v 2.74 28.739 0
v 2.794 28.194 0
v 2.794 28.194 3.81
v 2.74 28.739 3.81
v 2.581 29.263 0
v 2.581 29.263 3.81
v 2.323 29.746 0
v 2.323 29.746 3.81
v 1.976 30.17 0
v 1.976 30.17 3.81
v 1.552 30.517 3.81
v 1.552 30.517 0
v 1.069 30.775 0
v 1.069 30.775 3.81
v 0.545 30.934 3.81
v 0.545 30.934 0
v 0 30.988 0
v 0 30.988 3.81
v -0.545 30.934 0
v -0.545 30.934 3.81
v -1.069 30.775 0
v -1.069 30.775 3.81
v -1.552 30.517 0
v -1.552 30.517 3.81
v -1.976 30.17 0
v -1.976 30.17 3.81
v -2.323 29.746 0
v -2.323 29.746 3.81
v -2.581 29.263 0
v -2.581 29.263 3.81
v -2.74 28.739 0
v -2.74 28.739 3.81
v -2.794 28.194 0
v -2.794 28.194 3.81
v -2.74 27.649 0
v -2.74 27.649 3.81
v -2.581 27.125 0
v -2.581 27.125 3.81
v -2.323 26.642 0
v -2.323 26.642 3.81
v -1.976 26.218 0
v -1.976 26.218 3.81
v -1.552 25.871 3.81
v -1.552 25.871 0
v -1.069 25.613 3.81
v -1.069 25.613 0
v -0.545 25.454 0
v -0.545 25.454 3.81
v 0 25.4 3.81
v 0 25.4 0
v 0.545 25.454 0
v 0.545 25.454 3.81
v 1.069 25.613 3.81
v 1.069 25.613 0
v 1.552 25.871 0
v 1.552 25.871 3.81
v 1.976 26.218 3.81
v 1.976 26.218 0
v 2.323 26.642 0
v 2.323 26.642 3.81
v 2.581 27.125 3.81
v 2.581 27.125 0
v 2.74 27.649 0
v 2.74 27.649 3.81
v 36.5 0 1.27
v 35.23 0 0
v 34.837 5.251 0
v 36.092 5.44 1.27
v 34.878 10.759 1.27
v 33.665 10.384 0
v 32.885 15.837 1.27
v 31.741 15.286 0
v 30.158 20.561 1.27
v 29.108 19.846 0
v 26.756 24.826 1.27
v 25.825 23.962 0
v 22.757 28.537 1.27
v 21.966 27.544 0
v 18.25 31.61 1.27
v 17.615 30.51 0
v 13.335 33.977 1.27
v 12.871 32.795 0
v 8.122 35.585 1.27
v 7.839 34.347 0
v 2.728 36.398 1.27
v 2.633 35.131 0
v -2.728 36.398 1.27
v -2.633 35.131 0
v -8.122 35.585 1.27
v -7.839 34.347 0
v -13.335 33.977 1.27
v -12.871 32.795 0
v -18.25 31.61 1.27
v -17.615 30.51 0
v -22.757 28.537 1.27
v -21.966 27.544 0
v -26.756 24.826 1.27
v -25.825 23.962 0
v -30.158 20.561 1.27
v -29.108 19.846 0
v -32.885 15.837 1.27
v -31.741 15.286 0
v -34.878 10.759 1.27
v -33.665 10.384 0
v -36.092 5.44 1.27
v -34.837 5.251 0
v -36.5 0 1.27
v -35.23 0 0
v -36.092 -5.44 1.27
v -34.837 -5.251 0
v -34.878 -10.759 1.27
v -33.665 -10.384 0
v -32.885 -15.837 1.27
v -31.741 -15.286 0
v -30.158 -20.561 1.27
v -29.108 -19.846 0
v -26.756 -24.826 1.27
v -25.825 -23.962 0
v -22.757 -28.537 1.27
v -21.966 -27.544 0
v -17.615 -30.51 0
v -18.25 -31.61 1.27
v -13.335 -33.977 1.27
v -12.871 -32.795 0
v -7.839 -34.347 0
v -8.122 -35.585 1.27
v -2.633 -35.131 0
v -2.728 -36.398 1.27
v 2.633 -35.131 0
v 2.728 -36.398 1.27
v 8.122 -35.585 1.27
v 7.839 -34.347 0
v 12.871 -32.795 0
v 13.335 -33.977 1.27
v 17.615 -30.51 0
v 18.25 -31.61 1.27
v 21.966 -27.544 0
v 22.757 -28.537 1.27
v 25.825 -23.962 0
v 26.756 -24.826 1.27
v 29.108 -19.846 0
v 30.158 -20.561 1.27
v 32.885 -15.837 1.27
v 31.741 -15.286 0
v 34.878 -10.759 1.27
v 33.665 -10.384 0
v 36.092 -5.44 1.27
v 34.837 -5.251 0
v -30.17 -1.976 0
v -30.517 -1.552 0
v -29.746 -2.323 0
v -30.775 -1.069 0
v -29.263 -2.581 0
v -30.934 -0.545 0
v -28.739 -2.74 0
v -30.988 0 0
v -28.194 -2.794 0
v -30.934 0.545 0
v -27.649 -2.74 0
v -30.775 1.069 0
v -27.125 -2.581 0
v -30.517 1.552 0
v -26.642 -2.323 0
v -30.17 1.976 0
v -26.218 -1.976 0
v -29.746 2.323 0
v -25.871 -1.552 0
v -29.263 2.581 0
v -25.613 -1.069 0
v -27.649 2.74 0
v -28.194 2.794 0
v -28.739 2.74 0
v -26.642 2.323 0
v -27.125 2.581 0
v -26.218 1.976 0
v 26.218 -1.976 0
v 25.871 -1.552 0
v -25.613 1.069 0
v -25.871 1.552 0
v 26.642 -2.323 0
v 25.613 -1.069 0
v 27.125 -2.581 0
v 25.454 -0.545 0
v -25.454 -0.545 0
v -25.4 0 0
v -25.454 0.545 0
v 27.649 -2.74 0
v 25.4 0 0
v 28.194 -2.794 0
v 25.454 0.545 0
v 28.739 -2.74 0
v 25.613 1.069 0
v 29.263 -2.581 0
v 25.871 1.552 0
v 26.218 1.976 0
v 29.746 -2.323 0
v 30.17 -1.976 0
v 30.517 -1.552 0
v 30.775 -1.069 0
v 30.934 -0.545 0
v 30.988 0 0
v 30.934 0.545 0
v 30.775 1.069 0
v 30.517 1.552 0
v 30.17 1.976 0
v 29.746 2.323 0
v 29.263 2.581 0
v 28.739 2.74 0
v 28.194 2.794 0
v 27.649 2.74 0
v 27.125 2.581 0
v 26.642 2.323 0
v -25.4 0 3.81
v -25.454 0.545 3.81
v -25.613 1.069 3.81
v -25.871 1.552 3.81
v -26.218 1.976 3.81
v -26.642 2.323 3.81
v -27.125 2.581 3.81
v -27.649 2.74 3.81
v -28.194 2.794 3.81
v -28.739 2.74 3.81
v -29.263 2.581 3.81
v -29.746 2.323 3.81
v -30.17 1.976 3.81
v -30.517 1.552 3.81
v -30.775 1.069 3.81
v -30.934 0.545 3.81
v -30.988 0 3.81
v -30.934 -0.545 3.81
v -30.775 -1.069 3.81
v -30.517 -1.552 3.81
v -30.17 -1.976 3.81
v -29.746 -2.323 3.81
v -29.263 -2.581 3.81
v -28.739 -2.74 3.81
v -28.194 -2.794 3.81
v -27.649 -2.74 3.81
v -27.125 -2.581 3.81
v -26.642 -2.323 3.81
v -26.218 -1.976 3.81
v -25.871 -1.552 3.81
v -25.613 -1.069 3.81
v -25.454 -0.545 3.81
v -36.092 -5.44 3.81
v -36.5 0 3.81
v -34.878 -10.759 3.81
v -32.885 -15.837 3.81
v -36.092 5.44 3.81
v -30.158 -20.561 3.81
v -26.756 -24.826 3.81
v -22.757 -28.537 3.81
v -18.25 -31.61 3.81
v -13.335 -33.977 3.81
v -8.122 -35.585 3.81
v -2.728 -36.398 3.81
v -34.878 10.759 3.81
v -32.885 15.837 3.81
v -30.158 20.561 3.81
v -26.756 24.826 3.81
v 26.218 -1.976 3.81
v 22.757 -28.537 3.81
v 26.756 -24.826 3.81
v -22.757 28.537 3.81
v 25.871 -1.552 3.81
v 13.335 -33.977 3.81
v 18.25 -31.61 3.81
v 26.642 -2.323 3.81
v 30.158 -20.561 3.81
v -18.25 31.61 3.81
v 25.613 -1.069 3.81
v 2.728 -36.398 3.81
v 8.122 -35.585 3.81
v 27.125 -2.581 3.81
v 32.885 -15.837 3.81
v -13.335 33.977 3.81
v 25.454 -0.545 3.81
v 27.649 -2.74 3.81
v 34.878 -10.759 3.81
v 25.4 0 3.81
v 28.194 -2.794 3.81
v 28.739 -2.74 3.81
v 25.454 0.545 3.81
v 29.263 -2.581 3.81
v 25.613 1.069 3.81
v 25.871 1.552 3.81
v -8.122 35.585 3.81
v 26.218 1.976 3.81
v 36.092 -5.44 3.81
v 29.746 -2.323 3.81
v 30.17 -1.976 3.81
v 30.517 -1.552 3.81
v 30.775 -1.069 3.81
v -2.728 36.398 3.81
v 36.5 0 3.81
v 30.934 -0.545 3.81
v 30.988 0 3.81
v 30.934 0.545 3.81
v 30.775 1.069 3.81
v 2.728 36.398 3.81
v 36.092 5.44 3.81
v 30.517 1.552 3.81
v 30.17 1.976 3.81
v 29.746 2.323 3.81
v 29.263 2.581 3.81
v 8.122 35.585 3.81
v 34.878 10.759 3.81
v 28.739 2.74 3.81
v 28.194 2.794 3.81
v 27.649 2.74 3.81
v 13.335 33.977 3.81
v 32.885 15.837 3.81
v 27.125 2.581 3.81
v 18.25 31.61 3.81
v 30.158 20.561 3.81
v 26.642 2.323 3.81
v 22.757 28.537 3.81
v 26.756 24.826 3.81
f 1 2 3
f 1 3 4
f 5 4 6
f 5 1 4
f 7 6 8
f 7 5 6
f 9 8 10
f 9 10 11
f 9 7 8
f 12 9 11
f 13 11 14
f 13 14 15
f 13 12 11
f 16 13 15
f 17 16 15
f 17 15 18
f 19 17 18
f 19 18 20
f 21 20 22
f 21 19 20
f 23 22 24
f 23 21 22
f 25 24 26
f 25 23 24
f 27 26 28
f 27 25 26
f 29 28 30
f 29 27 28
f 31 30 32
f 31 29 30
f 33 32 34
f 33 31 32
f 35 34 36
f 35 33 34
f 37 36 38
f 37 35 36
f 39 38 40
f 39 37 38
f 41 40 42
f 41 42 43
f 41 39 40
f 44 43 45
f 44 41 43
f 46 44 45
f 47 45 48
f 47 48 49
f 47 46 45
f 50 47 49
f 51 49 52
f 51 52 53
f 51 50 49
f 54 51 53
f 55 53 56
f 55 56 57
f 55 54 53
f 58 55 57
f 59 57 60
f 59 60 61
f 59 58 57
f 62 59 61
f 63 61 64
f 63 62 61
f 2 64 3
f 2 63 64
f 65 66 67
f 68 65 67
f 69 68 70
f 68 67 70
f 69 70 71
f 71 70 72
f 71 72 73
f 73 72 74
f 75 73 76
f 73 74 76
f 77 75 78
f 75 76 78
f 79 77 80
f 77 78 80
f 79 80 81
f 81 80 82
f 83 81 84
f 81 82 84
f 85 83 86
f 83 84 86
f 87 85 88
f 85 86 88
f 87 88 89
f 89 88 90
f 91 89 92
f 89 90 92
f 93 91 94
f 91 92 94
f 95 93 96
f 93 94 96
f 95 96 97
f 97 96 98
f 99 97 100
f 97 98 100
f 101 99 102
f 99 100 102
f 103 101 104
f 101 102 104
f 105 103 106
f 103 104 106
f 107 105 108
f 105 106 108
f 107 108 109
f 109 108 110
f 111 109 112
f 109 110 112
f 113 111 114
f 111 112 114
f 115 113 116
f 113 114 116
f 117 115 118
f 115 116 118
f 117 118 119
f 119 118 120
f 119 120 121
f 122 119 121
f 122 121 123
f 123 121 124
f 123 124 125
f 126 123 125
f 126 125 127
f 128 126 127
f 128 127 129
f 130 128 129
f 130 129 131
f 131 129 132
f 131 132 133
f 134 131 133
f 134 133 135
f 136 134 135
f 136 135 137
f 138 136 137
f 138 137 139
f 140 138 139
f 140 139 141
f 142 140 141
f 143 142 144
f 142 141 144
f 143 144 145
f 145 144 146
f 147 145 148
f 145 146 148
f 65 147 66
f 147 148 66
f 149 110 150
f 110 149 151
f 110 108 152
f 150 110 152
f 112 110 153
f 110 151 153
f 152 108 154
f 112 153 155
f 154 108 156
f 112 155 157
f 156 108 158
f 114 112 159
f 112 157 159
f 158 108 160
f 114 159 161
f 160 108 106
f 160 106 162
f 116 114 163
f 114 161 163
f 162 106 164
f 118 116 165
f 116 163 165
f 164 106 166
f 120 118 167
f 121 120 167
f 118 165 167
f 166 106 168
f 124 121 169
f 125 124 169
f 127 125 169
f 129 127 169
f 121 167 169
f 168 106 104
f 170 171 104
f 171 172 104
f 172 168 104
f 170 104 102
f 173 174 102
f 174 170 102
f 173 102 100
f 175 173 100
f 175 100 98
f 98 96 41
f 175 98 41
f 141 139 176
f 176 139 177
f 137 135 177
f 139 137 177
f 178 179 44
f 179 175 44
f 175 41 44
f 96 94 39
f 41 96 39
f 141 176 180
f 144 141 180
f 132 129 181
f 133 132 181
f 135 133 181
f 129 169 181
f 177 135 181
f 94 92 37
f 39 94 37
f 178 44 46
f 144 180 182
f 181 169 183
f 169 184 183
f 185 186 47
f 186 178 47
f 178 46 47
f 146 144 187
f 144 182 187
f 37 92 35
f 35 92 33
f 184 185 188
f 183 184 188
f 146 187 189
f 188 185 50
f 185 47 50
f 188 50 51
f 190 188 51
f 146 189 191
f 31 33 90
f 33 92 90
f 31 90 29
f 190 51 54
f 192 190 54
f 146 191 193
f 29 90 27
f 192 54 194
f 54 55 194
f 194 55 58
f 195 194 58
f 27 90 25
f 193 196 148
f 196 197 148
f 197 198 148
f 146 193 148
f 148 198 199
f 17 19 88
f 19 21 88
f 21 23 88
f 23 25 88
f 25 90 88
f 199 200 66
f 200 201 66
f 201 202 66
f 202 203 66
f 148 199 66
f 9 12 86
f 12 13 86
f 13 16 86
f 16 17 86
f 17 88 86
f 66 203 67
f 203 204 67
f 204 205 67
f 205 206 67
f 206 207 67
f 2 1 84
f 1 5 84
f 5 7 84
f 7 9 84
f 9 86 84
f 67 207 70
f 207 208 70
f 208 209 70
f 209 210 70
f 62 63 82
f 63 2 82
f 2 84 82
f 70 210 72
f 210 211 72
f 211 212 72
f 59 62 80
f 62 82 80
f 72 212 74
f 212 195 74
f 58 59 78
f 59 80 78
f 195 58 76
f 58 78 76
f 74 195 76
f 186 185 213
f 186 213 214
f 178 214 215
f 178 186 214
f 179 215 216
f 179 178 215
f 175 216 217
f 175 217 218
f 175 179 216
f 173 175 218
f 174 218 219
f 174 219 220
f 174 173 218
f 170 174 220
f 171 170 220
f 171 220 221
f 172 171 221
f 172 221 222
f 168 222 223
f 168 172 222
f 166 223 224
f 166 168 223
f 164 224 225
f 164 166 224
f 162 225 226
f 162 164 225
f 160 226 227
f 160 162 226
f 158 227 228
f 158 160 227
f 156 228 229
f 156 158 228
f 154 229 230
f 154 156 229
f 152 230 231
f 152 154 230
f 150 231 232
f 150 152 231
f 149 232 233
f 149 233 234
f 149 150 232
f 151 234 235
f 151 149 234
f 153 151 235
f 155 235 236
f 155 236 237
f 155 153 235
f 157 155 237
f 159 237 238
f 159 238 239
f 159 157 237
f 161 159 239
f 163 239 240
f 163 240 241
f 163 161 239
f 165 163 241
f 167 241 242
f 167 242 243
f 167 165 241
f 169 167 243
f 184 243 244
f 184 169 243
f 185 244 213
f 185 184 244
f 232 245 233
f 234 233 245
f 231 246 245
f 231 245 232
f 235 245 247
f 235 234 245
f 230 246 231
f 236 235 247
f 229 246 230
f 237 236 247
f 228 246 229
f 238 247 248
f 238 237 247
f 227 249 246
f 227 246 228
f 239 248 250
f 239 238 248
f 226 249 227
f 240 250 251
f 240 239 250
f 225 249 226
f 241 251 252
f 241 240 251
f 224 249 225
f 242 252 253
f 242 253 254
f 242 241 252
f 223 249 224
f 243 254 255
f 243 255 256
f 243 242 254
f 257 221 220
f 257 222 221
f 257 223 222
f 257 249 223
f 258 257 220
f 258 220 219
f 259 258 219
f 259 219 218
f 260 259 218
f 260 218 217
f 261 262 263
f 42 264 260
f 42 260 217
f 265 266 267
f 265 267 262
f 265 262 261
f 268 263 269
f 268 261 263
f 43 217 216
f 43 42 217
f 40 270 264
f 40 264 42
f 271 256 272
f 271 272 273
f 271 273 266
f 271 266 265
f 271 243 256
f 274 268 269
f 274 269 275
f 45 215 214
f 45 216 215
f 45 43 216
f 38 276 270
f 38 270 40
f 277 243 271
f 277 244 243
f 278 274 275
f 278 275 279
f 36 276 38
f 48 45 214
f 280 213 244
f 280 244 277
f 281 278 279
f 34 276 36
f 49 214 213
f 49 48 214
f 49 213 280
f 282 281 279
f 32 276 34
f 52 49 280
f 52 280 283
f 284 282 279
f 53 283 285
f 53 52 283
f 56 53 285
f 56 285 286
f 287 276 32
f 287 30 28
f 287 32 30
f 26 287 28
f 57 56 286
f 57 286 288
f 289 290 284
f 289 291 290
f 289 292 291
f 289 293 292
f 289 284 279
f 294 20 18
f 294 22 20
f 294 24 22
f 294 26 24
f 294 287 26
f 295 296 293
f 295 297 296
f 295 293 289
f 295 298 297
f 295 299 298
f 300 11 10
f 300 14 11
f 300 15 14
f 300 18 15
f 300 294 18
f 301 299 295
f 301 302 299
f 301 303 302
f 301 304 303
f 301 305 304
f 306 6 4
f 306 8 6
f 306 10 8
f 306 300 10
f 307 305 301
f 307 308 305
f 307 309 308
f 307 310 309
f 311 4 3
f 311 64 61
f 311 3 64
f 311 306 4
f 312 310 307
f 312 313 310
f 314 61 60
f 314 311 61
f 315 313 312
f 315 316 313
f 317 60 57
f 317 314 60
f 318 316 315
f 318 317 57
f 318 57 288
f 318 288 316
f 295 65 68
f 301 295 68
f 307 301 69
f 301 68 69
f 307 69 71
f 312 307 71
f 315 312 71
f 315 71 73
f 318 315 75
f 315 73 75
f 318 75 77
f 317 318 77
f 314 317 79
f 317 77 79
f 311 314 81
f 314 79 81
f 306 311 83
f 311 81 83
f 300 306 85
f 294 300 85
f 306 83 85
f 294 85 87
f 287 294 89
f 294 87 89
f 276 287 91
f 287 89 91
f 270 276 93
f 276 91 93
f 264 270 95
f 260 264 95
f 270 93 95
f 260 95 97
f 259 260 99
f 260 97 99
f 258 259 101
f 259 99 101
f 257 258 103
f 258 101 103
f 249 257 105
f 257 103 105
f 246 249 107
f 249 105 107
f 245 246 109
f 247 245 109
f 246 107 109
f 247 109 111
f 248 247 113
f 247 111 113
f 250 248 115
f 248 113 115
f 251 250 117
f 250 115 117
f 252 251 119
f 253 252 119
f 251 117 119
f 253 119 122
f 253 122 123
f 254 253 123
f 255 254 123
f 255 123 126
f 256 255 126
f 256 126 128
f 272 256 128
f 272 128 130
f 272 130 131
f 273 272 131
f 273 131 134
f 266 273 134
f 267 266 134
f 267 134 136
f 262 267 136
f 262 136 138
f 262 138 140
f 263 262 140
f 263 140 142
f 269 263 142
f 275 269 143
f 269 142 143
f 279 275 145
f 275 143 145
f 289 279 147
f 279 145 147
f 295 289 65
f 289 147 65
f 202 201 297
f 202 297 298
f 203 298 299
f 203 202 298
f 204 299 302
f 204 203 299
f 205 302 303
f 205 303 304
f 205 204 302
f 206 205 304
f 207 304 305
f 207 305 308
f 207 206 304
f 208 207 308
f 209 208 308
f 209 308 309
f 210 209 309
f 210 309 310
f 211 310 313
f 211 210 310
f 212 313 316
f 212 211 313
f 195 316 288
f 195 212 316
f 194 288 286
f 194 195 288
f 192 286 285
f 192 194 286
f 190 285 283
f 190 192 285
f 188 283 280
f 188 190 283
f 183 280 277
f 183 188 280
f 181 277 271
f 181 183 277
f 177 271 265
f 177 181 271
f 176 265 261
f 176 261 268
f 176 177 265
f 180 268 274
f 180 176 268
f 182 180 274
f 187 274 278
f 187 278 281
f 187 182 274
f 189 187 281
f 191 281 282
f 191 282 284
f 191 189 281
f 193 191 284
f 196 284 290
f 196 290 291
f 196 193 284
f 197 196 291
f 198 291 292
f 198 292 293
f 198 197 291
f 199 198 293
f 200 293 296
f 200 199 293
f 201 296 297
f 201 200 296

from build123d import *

# Parameters (mm, degrees)
F0_R     = 36.5
F0_R_2   = 2.794
F1_DEPTH = 3.81
F2_SIZE  = 1.27


with BuildPart() as f1:
    # F0 (on Top) → F1 (new body)
    with BuildSketch(Plane.XY):
        Circle(F0_R)
        with Locations((-28.194, 0)):
            Circle(F0_R_2, mode=Mode.SUBTRACT)
        with Locations((28.194, 0)):
            Circle(F0_R_2, mode=Mode.SUBTRACT)
        with Locations((0, 28.194)):
            Circle(F0_R_2, mode=Mode.SUBTRACT)
    extrude(amount=F1_DEPTH)

    # F2
    f2_edges = [f1.edges().sort_by_distance(p)[0] for p in [
        (-36.5, 0, 0),
    ]]
    chamfer(f2_edges, length=F2_SIZE)


solid = f1.part
